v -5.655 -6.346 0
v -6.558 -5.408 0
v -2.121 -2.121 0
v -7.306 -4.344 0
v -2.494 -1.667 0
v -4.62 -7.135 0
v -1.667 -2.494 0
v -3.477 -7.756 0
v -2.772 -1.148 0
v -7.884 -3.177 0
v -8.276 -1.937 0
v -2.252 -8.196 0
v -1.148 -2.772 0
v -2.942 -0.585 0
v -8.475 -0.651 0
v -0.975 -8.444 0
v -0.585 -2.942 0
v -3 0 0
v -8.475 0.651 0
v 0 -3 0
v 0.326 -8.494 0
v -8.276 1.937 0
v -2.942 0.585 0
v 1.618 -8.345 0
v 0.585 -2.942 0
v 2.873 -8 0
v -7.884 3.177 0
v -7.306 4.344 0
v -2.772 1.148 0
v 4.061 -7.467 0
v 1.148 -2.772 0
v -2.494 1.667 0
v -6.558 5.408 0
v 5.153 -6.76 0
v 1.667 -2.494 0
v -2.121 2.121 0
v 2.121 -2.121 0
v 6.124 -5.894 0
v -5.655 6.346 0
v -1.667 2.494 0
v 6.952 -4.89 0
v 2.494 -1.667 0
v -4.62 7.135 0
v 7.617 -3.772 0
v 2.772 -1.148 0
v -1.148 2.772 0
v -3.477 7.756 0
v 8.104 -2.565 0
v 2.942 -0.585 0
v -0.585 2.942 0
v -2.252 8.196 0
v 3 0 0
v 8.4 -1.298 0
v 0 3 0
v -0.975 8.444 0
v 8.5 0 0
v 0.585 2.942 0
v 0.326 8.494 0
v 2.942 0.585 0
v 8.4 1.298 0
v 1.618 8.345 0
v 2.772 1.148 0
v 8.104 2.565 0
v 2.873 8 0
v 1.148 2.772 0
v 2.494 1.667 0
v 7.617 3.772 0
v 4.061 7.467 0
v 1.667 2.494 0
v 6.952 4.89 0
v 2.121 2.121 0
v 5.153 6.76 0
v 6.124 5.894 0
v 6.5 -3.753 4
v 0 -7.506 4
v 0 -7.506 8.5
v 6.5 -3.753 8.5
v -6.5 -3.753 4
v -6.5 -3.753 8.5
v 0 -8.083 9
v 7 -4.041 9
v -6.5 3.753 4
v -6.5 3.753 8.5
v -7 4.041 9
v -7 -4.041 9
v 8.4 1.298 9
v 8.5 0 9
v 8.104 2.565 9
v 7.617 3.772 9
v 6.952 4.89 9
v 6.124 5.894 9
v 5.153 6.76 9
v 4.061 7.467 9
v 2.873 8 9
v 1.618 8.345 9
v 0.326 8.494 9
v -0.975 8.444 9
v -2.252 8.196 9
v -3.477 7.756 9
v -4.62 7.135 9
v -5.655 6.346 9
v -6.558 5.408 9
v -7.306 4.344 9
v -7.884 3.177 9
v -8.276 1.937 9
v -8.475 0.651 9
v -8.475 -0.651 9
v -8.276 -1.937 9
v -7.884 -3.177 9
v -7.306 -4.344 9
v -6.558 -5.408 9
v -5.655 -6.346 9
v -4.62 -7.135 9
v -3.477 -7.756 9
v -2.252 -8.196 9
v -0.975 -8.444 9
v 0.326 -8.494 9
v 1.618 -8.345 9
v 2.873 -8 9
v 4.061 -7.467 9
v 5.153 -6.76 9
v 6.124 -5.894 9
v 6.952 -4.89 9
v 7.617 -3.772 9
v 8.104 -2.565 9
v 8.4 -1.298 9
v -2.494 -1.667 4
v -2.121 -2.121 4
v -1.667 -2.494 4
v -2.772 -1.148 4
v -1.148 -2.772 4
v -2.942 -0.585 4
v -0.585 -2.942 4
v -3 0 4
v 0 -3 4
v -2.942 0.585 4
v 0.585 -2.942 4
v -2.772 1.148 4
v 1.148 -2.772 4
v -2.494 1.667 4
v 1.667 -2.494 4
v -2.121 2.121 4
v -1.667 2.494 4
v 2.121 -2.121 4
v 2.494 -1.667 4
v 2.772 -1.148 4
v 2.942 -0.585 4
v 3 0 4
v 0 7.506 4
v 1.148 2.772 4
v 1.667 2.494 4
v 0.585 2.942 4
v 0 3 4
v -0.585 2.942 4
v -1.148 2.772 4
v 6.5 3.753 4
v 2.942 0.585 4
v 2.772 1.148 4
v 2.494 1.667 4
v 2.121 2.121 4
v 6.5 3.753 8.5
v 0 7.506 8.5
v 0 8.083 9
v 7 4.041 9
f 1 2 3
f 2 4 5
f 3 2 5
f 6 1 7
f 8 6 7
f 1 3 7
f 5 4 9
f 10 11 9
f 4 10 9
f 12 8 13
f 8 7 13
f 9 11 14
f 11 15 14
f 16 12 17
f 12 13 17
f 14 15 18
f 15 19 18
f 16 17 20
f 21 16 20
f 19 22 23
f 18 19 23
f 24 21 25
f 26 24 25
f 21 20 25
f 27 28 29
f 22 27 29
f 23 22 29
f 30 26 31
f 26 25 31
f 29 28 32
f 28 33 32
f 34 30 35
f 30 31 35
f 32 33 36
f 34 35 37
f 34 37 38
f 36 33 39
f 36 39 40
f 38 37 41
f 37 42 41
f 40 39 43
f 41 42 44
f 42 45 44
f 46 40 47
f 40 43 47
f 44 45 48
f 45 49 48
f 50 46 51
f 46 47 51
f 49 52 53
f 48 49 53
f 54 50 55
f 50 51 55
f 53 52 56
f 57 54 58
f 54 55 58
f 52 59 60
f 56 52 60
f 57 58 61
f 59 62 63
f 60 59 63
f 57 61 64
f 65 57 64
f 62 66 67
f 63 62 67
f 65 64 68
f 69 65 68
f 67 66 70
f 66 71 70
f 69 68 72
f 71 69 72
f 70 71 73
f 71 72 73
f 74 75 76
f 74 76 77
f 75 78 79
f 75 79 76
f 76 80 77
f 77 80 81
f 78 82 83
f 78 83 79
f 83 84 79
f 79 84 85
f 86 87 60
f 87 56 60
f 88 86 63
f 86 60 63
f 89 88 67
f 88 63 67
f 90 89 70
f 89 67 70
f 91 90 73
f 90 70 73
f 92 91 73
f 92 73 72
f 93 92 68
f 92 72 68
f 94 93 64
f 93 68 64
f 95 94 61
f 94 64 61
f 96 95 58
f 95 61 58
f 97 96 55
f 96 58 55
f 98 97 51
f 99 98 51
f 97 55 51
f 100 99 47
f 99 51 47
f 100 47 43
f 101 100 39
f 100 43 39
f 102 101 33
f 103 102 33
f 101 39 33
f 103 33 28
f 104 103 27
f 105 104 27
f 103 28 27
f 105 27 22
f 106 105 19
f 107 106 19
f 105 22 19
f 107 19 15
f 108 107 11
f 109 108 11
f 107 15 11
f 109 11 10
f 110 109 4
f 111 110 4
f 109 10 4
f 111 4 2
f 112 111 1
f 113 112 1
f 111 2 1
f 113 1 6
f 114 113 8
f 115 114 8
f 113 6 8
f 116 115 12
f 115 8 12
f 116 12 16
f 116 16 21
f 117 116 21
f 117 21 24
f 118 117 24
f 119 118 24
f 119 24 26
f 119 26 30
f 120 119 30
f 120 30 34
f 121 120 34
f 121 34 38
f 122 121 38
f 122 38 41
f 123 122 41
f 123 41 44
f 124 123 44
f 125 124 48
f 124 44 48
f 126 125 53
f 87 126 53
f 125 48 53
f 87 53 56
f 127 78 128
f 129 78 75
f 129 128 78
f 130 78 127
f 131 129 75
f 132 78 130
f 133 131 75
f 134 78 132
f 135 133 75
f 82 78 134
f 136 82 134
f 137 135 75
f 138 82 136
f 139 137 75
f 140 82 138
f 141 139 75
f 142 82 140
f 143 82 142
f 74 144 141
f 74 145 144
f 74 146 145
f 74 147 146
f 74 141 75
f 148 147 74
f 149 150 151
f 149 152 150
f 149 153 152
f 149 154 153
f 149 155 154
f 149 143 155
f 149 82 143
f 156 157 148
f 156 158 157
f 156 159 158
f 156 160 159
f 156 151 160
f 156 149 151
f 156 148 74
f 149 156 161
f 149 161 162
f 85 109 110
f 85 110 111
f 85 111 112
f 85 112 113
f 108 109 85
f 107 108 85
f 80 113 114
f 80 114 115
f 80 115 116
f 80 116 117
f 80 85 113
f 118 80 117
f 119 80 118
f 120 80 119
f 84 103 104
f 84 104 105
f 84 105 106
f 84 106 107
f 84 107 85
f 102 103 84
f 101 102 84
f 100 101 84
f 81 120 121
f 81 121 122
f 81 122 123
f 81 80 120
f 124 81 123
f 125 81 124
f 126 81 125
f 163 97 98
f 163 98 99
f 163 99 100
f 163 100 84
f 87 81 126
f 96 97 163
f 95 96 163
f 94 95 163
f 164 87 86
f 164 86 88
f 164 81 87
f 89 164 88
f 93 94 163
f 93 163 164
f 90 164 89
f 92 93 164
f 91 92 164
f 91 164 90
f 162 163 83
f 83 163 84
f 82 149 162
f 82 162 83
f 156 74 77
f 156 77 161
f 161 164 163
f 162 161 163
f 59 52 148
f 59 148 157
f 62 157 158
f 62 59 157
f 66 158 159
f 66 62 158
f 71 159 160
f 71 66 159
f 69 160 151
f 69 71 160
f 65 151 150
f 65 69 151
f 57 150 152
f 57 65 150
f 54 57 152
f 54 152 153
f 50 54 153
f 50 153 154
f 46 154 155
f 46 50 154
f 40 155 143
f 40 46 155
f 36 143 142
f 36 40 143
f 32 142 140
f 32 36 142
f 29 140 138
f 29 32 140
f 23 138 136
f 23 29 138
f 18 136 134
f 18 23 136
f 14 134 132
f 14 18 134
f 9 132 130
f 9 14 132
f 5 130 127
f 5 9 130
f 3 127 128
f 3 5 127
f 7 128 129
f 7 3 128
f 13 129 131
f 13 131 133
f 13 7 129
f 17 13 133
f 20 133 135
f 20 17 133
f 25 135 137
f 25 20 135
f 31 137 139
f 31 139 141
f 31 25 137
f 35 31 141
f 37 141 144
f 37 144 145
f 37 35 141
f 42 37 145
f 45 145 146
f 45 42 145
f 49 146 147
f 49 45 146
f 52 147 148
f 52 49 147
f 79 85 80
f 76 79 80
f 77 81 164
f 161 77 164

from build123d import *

# Parameters (mm, degrees)
SKETCH_R     = 8.5
SKETCH_R_2   = 3
PAD_DEPTH    = 4
SKETCH001_R  = 8.5
PAD001_DEPTH = 5
CHAMFER_SIZE = 0.5


with BuildPart() as part:
    # Sketch → Pad (new body)
    with BuildSketch(Plane.XY):
        Circle(SKETCH_R)
        Circle(SKETCH_R_2, mode=Mode.SUBTRACT)
    extrude(amount=PAD_DEPTH)

    # Sketch001 (on Face4 of Pad) → Pad001 (join)
    with BuildSketch(Plane.XY.offset(4)):
        Circle(SKETCH001_R)
        Polygon((6.5, -3.752777), (6.5, 3.752777), (0, 7.505553), (-6.5, 3.752777), (-6.5, -3.752777), (0, -7.505553), align=None, mode=Mode.SUBTRACT)
    extrude(amount=PAD001_DEPTH)

    # Chamfer
    chamfer_edges = [part.edges().sort_by_distance(p)[0] for p in [
        (-3.25, 5.629165, 9),
        (3.25, 5.629165, 9),
        (6.5, 0, 9),
        (3.25, -5.629165, 9),
        (-3.25, -5.629165, 9),
        (-6.5, 0, 9),
    ]]
    chamfer(chamfer_edges, length=CHAMFER_SIZE)


solid = part.part
